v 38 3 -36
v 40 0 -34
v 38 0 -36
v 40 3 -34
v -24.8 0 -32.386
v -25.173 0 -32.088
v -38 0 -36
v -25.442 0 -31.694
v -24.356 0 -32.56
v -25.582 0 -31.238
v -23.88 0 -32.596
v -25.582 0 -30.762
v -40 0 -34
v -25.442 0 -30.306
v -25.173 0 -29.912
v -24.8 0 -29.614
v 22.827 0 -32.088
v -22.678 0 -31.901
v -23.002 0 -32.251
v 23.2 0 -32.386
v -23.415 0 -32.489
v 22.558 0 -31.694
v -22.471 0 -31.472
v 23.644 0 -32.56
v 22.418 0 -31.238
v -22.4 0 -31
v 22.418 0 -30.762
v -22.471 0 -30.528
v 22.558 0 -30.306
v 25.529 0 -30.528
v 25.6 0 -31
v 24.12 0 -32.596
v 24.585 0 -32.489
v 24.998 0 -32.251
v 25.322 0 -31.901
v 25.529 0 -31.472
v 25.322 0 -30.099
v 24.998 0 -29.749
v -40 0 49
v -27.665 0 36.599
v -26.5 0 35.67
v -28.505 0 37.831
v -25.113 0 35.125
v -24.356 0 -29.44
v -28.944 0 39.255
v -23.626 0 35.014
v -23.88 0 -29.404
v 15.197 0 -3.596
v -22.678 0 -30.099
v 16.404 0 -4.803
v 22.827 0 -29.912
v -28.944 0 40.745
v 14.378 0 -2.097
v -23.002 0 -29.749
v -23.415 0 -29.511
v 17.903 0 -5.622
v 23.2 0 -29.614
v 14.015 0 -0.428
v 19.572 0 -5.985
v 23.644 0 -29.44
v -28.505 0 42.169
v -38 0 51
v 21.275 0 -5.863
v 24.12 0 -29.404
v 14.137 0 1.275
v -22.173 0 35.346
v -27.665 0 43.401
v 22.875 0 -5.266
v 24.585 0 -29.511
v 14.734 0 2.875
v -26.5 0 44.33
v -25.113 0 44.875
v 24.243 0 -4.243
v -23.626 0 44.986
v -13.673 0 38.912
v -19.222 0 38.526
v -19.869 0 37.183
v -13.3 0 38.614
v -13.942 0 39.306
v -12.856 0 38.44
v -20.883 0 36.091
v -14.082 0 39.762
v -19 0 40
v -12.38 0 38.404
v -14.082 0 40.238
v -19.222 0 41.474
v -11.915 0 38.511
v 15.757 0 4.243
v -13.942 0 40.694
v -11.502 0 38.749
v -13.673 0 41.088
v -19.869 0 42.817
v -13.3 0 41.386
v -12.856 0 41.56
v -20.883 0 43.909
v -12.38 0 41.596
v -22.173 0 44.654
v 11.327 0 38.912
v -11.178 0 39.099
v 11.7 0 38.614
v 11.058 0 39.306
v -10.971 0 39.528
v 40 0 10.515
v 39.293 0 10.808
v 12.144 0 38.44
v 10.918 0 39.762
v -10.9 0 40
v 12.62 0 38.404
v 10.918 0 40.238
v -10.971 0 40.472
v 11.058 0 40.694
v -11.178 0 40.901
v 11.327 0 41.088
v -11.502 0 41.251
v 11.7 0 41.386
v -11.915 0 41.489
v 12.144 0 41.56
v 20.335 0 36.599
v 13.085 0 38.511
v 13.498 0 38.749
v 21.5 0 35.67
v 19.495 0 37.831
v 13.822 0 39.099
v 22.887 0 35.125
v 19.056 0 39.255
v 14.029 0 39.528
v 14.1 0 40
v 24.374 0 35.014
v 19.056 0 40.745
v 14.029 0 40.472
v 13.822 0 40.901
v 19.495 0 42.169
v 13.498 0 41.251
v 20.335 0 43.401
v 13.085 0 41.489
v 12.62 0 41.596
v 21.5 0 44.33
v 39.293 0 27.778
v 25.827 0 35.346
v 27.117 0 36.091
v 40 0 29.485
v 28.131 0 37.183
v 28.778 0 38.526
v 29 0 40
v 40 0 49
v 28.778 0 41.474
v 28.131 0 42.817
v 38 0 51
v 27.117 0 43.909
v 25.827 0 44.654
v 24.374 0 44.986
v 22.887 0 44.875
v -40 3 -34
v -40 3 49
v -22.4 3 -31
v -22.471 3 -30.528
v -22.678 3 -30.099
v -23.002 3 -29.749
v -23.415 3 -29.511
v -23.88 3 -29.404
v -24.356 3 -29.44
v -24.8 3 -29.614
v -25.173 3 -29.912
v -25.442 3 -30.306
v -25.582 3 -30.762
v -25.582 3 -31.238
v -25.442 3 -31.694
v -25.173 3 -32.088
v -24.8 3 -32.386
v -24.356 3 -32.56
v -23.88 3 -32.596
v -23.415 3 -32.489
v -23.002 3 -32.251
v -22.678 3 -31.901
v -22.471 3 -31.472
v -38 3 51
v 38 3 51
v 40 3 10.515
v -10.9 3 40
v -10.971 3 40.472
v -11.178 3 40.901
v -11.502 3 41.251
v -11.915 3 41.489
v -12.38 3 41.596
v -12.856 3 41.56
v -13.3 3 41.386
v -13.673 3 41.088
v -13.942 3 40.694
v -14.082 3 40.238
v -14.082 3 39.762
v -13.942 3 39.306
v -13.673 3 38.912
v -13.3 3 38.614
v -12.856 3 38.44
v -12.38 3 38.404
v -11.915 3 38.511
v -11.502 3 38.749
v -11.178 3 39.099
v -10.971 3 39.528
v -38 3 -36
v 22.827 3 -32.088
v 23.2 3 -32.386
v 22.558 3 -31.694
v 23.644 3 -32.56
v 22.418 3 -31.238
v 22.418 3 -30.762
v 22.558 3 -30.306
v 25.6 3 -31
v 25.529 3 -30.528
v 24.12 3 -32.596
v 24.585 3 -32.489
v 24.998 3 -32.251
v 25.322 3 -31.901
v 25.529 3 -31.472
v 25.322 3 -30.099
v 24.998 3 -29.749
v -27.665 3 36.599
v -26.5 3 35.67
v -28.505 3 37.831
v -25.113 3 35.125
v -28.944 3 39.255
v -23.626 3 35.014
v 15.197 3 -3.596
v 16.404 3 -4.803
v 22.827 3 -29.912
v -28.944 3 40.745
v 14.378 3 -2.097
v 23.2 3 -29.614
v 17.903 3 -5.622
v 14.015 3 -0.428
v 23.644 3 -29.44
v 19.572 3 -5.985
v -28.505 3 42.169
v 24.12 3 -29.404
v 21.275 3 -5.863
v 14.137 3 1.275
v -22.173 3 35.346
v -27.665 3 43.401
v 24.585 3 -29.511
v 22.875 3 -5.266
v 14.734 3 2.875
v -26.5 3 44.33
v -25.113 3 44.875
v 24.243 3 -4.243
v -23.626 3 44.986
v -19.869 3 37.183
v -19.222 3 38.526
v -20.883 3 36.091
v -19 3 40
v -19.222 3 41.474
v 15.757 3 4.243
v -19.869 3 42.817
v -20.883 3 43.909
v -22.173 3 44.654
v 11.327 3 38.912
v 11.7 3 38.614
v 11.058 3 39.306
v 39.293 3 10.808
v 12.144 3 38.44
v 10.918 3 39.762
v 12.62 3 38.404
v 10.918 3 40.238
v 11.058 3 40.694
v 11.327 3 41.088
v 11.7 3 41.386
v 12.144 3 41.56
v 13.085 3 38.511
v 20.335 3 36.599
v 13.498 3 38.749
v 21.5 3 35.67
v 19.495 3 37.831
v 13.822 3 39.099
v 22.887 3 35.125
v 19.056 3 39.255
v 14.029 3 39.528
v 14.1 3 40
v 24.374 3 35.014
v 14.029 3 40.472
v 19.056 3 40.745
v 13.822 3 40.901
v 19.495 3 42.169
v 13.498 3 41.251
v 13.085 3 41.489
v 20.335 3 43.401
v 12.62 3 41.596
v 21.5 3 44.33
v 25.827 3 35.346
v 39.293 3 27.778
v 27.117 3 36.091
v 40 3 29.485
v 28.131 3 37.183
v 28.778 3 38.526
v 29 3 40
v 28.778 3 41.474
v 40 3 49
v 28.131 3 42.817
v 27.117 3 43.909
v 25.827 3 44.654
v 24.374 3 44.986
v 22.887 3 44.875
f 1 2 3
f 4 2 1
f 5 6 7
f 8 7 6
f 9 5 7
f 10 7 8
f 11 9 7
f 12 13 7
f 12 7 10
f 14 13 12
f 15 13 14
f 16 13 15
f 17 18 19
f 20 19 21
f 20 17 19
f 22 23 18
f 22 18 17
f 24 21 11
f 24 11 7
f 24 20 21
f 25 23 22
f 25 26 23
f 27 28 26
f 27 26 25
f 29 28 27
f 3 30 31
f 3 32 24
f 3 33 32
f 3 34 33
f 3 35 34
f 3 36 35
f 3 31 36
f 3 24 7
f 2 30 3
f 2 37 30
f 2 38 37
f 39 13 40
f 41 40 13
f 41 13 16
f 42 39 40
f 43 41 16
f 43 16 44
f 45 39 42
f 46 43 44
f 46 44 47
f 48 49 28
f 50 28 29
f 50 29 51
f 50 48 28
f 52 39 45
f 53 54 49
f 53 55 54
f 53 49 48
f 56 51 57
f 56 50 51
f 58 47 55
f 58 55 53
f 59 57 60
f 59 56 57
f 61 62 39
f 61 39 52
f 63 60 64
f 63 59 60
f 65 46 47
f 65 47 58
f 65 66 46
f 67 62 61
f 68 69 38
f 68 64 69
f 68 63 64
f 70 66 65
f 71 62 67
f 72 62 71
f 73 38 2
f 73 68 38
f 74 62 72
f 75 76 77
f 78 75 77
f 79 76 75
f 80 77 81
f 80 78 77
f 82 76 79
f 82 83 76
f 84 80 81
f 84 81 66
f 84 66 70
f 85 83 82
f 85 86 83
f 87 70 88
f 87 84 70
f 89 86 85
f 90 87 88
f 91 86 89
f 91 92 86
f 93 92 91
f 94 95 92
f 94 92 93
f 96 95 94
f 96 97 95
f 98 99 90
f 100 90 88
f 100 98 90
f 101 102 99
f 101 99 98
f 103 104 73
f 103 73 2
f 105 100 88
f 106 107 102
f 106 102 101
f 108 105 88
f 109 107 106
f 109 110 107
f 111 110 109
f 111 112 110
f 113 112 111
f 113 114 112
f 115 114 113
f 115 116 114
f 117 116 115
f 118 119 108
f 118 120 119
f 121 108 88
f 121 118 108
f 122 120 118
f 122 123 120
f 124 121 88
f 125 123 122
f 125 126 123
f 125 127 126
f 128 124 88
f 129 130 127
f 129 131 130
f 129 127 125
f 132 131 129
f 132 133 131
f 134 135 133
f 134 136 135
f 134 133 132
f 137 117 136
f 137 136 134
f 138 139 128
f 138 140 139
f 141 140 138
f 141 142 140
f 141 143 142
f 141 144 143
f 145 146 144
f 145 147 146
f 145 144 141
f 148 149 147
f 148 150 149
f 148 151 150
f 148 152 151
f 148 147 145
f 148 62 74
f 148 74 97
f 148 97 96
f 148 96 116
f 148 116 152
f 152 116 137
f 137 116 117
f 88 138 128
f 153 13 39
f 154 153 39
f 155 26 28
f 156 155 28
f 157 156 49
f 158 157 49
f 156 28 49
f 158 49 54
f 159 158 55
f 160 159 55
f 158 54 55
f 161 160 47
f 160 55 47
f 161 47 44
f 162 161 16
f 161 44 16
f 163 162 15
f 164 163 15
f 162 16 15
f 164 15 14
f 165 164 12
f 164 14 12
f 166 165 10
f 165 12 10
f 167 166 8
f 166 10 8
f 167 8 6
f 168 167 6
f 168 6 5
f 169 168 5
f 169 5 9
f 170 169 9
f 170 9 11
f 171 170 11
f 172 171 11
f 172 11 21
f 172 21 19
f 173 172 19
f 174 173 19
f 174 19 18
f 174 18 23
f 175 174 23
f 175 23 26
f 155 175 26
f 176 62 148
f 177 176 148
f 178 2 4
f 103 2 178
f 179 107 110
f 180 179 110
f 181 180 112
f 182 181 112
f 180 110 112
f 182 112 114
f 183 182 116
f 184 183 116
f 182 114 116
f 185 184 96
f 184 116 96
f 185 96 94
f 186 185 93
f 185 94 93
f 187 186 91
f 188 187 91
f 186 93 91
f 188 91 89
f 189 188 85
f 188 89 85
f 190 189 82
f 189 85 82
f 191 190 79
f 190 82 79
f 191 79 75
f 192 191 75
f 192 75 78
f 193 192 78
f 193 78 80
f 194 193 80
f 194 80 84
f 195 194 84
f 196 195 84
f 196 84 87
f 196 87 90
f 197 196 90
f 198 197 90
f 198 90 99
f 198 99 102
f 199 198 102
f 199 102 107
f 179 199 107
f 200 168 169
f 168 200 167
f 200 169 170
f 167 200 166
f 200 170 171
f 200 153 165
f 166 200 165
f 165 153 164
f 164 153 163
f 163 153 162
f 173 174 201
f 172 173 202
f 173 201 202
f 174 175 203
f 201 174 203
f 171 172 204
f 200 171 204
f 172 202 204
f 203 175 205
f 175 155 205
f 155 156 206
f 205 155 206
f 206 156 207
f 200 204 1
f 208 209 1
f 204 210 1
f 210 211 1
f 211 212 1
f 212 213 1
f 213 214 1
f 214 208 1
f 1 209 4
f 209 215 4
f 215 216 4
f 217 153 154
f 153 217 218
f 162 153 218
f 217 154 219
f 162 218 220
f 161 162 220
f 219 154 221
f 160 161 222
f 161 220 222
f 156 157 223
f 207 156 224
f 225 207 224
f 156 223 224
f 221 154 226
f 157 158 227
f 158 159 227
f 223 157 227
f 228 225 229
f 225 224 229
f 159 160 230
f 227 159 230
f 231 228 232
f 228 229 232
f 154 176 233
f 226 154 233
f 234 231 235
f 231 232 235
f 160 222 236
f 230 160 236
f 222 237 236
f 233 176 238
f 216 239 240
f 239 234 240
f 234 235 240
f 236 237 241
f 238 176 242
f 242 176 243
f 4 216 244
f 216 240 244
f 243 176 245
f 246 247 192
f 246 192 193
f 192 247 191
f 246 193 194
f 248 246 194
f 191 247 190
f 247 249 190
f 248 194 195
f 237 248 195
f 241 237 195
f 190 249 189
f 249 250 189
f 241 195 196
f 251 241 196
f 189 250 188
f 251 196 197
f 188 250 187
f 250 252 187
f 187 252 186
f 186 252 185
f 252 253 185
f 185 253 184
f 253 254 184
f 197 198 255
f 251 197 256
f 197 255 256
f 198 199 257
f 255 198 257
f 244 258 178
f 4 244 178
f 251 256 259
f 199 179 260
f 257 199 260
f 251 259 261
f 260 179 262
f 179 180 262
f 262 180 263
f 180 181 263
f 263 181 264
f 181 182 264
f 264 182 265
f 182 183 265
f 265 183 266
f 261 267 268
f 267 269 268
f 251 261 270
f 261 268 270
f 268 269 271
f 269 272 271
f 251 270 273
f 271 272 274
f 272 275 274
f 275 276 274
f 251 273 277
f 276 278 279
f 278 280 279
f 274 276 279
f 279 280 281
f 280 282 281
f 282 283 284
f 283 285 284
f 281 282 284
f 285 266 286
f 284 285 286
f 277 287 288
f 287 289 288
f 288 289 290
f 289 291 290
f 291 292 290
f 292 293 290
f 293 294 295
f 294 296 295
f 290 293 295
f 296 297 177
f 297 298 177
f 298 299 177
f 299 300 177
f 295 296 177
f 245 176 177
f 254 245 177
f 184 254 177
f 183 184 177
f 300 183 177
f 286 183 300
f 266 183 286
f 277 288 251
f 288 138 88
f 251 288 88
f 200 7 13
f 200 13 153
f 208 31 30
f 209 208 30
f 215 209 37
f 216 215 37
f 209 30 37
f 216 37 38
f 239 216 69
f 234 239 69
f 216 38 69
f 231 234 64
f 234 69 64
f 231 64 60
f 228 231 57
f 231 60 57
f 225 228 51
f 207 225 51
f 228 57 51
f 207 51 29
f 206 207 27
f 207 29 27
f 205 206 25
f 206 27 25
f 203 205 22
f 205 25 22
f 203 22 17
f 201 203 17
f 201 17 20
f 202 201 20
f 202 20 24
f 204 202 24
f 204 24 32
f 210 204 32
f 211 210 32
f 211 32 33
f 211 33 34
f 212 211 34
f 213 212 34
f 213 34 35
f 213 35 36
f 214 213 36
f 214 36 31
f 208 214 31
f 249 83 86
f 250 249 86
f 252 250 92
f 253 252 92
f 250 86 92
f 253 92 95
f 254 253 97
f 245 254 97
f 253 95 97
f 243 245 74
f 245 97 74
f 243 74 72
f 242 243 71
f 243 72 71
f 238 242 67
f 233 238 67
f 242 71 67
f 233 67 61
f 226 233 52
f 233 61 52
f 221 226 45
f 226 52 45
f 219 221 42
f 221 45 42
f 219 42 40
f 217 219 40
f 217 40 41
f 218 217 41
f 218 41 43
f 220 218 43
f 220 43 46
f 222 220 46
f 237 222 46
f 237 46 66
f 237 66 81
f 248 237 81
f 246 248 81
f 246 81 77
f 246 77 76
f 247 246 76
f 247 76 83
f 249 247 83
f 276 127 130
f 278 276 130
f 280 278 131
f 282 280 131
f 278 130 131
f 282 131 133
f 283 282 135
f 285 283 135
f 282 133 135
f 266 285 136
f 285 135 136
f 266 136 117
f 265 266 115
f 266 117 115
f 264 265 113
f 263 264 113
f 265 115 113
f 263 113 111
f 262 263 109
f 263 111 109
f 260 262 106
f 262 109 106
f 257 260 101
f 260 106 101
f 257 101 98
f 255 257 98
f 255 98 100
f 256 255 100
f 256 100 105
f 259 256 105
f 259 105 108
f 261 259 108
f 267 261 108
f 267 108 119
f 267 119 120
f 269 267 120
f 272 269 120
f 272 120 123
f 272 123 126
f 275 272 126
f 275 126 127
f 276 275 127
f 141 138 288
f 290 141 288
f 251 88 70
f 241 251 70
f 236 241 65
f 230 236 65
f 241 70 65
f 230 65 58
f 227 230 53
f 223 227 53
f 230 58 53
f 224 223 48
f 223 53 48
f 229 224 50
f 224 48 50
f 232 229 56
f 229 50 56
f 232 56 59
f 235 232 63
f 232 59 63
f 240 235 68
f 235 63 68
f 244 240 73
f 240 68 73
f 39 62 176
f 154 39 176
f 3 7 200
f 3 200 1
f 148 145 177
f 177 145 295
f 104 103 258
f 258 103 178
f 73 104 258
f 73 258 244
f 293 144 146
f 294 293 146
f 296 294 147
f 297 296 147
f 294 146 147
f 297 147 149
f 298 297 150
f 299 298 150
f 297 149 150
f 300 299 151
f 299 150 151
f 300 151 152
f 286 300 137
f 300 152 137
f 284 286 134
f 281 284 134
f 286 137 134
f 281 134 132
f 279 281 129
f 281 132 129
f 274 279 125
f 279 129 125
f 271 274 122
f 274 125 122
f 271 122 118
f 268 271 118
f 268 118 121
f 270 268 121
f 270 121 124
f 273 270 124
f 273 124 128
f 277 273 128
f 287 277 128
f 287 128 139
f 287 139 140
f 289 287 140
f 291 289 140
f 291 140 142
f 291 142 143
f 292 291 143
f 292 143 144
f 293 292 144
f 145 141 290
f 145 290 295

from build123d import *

# Parameters (mm, degrees)
SKETCH037_W     = 80
SKETCH037_H     = 87
PAD015_DEPTH    = 3
SKETCH038_R     = 1.6
SKETCH038_R_2   = 5
POCKET021_DEPTH = 3.001
CHAMFER019_SIZE = 2
SKETCH044_R     = 1.6
POCKET025_DEPTH = 3.001
POCKET030_DEPTH = 3.001
CHAMFER029_SIZE = 1


with BuildPart() as part:
    # Sketch037 → Pad015 (new body)
    with BuildSketch(Plane.XZ):
        with Locations((0, 7.5)):
            Rectangle(SKETCH037_W, SKETCH037_H)
    extrude(amount=-PAD015_DEPTH)

    # Sketch038 → Pocket021 (cut, through all)
    with BuildSketch(Plane.XZ):
        with Locations((-12.5, 40)):
            Circle(SKETCH038_R)
        with Locations((12.5, 40)):
            Circle(SKETCH038_R)
        with Locations((-24, 40)):
            Circle(SKETCH038_R_2)
        with Locations((24, 40)):
            Circle(SKETCH038_R_2)
    extrude(amount=-POCKET021_DEPTH, mode=Mode.SUBTRACT)

    # Chamfer019
    chamfer019_edges = [part.edges().sort_by_distance(p)[0] for p in [
        (40, 1.5, 51),
        (-40, 1.5, 51),
        (40, 1.5, -36),
        (-40, 1.5, -36),
    ]]
    chamfer(chamfer019_edges, length=CHAMFER019_SIZE)

    # Sketch044 → Pocket025 (cut, through all)
    with BuildSketch(Plane.XZ):
        with Locations((24, -31)):
            Circle(SKETCH044_R)
        with Locations((-24, -31)):
            Circle(SKETCH044_R)
    extrude(amount=-POCKET025_DEPTH, mode=Mode.SUBTRACT)

    # Sketch054 (on Face2 of Pocket025) → Pocket030 (cut, through all)
    with BuildSketch(Plane.XZ):
        with BuildLine():
            Line((40, 28.485281), (15.757359, 4.242641))
            ThreePointArc((15.757359, 4.242641), (15.757359, -4.242641), (24.242641, -4.242641))
            Line((40, 11.514719), (24.242641, -4.242641))
            Line((40, 28.485281), (40, 11.514719))
        make_face()
    extrude(amount=-POCKET030_DEPTH, mode=Mode.SUBTRACT)

    # Chamfer029
    chamfer029_edges = [part.edges().sort_by_distance(p)[0] for p in [
        (40, 1.5, 28.485281),
        (40, 1.5, 11.514719),
    ]]
    chamfer(chamfer029_edges, length=CHAMFER029_SIZE)


solid = part.part
